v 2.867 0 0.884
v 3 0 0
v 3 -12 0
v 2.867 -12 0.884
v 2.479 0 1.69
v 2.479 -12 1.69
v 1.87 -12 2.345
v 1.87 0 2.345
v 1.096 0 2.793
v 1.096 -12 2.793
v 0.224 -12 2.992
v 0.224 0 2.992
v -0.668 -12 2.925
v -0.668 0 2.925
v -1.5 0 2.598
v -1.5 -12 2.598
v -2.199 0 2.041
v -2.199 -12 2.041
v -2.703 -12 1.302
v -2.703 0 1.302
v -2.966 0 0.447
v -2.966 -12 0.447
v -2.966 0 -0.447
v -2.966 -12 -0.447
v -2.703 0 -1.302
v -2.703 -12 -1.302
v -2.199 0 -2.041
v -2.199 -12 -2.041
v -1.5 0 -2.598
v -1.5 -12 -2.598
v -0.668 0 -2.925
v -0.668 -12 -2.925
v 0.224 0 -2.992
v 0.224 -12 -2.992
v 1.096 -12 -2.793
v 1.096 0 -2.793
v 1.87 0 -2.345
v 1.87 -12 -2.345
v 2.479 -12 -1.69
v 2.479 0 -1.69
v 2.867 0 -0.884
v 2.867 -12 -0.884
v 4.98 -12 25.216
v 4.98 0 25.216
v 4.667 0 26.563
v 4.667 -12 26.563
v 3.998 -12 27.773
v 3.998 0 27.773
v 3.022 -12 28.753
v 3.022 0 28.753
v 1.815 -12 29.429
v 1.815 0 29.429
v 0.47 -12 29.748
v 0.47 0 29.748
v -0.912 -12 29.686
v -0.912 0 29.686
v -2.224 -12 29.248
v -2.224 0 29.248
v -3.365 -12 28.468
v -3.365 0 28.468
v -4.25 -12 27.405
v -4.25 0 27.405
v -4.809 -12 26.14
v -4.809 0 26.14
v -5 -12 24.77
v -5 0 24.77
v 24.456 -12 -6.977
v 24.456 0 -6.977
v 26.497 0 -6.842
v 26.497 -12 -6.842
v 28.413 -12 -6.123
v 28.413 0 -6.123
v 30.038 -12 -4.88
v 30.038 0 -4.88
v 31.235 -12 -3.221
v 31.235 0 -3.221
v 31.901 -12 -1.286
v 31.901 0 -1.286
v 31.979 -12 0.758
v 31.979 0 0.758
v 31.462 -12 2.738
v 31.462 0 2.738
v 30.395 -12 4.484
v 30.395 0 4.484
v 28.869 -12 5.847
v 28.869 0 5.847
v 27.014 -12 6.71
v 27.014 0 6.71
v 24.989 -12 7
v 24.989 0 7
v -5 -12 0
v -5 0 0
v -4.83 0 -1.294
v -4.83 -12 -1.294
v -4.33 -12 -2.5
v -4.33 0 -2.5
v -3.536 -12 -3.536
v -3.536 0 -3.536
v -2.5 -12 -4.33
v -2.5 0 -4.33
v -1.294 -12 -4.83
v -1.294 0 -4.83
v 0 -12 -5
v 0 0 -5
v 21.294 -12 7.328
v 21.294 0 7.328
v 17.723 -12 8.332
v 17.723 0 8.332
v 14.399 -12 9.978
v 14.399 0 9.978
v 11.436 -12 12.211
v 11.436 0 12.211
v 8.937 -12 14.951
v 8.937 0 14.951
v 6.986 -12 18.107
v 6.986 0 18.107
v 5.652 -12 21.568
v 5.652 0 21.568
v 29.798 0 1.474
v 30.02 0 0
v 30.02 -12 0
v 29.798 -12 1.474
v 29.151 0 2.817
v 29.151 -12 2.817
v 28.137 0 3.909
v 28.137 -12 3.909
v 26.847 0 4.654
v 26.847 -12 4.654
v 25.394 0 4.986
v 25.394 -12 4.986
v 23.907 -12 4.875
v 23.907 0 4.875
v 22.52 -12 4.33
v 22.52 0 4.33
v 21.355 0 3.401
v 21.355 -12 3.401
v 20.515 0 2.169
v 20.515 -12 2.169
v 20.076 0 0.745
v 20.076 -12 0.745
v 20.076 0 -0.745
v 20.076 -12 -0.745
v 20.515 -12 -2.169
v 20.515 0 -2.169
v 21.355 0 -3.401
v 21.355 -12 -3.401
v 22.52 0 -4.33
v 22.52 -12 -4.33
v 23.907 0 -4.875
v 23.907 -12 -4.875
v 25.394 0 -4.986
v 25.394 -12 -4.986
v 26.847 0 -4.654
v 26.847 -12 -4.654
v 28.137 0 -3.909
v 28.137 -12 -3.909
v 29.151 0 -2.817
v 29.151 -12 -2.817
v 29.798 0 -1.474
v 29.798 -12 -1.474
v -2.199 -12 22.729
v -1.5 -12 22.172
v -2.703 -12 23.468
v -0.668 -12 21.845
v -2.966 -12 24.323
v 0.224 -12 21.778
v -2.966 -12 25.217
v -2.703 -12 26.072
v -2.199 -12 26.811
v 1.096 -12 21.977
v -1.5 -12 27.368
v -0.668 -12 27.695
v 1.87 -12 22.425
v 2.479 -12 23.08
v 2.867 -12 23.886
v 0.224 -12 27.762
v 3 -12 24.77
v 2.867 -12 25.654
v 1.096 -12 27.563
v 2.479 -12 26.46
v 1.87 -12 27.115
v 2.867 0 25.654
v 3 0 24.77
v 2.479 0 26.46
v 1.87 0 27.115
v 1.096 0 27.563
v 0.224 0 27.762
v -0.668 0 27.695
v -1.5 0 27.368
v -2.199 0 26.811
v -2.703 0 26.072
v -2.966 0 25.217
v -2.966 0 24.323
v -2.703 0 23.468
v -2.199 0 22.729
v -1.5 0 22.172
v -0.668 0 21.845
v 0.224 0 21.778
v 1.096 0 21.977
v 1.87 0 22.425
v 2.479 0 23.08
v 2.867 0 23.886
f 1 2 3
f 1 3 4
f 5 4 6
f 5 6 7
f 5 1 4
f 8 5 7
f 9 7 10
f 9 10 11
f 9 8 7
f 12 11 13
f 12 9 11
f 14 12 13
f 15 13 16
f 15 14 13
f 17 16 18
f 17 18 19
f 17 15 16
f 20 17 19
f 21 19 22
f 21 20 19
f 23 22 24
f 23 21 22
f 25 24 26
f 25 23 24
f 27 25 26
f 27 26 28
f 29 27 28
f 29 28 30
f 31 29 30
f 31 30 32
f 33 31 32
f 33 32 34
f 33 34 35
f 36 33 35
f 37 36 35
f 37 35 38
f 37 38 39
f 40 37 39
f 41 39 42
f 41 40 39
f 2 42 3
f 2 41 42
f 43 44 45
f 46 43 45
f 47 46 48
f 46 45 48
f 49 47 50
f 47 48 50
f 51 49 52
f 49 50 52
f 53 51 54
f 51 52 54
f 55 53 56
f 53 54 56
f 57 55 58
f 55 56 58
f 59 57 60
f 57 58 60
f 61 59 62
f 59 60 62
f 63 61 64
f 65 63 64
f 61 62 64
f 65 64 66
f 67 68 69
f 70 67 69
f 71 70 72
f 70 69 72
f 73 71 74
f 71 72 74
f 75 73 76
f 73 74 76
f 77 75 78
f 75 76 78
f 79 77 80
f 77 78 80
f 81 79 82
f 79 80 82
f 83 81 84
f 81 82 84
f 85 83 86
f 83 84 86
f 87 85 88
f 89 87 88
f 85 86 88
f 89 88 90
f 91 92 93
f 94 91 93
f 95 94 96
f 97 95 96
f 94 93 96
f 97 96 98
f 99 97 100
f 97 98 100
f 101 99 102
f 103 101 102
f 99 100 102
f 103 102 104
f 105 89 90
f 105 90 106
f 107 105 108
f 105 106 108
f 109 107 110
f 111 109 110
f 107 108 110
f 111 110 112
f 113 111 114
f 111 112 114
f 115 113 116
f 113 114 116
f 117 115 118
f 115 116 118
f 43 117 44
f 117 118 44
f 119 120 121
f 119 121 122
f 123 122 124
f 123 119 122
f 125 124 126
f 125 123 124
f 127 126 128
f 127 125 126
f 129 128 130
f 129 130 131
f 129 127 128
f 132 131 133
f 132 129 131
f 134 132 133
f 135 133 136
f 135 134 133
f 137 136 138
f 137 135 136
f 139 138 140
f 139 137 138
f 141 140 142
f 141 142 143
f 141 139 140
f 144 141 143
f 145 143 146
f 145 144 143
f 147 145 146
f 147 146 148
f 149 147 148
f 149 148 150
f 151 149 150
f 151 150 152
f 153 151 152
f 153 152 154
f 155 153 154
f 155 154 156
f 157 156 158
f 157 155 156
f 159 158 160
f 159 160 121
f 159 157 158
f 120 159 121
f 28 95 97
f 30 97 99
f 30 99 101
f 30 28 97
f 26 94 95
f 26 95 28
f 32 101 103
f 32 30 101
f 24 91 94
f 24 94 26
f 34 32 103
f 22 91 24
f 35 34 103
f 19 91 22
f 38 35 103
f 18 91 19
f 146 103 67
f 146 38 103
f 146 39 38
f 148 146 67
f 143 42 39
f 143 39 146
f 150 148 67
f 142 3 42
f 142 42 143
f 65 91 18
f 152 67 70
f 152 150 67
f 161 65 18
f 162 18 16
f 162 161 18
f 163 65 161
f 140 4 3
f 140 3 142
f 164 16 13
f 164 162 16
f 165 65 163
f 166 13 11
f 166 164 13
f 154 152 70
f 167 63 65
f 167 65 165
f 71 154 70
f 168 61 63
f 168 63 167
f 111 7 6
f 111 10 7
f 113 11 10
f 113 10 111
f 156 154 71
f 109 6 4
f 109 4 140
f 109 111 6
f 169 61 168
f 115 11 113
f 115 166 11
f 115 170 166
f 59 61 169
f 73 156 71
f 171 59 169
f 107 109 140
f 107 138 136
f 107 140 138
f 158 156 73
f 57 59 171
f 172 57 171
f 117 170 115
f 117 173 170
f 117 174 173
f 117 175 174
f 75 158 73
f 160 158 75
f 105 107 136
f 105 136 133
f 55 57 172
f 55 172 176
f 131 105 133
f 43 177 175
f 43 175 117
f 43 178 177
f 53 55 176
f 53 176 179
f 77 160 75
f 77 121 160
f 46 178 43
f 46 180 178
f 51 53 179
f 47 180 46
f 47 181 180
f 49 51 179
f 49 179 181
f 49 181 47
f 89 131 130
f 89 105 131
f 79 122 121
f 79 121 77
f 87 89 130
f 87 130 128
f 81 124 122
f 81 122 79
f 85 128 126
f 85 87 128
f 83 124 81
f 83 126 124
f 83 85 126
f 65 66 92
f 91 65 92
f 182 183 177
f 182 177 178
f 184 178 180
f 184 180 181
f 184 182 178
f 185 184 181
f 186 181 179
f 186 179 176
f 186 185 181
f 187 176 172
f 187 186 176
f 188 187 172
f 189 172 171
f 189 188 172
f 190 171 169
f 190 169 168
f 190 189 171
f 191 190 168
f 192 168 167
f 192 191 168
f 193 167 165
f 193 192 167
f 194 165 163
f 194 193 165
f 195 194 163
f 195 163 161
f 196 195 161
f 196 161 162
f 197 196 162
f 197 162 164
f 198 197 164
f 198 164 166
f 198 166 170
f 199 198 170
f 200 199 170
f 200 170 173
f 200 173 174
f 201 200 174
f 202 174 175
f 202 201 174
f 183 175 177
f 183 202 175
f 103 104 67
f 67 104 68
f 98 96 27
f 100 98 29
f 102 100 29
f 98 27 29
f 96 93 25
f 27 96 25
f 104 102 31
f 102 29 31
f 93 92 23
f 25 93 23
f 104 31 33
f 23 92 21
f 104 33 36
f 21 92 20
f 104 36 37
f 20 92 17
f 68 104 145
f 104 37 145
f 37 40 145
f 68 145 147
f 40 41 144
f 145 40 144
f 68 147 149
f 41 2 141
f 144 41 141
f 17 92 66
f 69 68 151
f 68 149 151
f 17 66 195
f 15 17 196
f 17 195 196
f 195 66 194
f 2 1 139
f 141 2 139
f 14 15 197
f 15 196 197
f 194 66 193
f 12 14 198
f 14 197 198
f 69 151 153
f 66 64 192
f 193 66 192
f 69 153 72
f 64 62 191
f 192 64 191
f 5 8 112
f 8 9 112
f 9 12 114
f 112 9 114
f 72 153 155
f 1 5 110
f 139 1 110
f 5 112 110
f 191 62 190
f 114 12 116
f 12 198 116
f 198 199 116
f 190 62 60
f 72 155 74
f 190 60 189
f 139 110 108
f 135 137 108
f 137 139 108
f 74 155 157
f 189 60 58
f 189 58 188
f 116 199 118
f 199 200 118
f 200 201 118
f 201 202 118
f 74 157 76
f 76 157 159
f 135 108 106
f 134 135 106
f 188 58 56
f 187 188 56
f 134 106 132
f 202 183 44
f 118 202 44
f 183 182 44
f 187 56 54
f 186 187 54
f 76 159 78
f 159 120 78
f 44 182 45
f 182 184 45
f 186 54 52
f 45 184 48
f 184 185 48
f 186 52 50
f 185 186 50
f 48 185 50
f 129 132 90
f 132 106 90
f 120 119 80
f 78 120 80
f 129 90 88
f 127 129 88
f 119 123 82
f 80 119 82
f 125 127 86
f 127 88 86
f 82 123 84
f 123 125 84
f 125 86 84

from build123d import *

# Parameters (mm, degrees)
F0_R     = 3
F0_R_2   = 5
F1_DEPTH = 12


with BuildPart() as f1:
    # F0 (on Front) → F1 (new body)
    with BuildSketch(Plane.XZ):
        with BuildLine():
            Line((-5, 24.77), (-5, 0))
            ThreePointArc((-5, 0), (-3.535534, -3.535534), (0, -5))
            Line((0, -5), (24.455898, -6.977234))
            ThreePointArc((24.455898, -6.977234), (32.014914, -0.266785), (24.988984, 6.999931))
            ThreePointArc((24.988984, 6.999931), (11.436354, 12.210538), (4.980073, 25.215947))
            ThreePointArc((4.980073, 25.215947), (-0.223196, 29.765016), (-5, 24.77))
        make_face()
        Circle(F0_R, mode=Mode.SUBTRACT)
        with Locations((25.02, 0)):
            Circle(F0_R_2, mode=Mode.SUBTRACT)
        with Locations((0, 24.77)):
            Circle(F0_R, mode=Mode.SUBTRACT)
    extrude(amount=F1_DEPTH)


solid = f1.part
